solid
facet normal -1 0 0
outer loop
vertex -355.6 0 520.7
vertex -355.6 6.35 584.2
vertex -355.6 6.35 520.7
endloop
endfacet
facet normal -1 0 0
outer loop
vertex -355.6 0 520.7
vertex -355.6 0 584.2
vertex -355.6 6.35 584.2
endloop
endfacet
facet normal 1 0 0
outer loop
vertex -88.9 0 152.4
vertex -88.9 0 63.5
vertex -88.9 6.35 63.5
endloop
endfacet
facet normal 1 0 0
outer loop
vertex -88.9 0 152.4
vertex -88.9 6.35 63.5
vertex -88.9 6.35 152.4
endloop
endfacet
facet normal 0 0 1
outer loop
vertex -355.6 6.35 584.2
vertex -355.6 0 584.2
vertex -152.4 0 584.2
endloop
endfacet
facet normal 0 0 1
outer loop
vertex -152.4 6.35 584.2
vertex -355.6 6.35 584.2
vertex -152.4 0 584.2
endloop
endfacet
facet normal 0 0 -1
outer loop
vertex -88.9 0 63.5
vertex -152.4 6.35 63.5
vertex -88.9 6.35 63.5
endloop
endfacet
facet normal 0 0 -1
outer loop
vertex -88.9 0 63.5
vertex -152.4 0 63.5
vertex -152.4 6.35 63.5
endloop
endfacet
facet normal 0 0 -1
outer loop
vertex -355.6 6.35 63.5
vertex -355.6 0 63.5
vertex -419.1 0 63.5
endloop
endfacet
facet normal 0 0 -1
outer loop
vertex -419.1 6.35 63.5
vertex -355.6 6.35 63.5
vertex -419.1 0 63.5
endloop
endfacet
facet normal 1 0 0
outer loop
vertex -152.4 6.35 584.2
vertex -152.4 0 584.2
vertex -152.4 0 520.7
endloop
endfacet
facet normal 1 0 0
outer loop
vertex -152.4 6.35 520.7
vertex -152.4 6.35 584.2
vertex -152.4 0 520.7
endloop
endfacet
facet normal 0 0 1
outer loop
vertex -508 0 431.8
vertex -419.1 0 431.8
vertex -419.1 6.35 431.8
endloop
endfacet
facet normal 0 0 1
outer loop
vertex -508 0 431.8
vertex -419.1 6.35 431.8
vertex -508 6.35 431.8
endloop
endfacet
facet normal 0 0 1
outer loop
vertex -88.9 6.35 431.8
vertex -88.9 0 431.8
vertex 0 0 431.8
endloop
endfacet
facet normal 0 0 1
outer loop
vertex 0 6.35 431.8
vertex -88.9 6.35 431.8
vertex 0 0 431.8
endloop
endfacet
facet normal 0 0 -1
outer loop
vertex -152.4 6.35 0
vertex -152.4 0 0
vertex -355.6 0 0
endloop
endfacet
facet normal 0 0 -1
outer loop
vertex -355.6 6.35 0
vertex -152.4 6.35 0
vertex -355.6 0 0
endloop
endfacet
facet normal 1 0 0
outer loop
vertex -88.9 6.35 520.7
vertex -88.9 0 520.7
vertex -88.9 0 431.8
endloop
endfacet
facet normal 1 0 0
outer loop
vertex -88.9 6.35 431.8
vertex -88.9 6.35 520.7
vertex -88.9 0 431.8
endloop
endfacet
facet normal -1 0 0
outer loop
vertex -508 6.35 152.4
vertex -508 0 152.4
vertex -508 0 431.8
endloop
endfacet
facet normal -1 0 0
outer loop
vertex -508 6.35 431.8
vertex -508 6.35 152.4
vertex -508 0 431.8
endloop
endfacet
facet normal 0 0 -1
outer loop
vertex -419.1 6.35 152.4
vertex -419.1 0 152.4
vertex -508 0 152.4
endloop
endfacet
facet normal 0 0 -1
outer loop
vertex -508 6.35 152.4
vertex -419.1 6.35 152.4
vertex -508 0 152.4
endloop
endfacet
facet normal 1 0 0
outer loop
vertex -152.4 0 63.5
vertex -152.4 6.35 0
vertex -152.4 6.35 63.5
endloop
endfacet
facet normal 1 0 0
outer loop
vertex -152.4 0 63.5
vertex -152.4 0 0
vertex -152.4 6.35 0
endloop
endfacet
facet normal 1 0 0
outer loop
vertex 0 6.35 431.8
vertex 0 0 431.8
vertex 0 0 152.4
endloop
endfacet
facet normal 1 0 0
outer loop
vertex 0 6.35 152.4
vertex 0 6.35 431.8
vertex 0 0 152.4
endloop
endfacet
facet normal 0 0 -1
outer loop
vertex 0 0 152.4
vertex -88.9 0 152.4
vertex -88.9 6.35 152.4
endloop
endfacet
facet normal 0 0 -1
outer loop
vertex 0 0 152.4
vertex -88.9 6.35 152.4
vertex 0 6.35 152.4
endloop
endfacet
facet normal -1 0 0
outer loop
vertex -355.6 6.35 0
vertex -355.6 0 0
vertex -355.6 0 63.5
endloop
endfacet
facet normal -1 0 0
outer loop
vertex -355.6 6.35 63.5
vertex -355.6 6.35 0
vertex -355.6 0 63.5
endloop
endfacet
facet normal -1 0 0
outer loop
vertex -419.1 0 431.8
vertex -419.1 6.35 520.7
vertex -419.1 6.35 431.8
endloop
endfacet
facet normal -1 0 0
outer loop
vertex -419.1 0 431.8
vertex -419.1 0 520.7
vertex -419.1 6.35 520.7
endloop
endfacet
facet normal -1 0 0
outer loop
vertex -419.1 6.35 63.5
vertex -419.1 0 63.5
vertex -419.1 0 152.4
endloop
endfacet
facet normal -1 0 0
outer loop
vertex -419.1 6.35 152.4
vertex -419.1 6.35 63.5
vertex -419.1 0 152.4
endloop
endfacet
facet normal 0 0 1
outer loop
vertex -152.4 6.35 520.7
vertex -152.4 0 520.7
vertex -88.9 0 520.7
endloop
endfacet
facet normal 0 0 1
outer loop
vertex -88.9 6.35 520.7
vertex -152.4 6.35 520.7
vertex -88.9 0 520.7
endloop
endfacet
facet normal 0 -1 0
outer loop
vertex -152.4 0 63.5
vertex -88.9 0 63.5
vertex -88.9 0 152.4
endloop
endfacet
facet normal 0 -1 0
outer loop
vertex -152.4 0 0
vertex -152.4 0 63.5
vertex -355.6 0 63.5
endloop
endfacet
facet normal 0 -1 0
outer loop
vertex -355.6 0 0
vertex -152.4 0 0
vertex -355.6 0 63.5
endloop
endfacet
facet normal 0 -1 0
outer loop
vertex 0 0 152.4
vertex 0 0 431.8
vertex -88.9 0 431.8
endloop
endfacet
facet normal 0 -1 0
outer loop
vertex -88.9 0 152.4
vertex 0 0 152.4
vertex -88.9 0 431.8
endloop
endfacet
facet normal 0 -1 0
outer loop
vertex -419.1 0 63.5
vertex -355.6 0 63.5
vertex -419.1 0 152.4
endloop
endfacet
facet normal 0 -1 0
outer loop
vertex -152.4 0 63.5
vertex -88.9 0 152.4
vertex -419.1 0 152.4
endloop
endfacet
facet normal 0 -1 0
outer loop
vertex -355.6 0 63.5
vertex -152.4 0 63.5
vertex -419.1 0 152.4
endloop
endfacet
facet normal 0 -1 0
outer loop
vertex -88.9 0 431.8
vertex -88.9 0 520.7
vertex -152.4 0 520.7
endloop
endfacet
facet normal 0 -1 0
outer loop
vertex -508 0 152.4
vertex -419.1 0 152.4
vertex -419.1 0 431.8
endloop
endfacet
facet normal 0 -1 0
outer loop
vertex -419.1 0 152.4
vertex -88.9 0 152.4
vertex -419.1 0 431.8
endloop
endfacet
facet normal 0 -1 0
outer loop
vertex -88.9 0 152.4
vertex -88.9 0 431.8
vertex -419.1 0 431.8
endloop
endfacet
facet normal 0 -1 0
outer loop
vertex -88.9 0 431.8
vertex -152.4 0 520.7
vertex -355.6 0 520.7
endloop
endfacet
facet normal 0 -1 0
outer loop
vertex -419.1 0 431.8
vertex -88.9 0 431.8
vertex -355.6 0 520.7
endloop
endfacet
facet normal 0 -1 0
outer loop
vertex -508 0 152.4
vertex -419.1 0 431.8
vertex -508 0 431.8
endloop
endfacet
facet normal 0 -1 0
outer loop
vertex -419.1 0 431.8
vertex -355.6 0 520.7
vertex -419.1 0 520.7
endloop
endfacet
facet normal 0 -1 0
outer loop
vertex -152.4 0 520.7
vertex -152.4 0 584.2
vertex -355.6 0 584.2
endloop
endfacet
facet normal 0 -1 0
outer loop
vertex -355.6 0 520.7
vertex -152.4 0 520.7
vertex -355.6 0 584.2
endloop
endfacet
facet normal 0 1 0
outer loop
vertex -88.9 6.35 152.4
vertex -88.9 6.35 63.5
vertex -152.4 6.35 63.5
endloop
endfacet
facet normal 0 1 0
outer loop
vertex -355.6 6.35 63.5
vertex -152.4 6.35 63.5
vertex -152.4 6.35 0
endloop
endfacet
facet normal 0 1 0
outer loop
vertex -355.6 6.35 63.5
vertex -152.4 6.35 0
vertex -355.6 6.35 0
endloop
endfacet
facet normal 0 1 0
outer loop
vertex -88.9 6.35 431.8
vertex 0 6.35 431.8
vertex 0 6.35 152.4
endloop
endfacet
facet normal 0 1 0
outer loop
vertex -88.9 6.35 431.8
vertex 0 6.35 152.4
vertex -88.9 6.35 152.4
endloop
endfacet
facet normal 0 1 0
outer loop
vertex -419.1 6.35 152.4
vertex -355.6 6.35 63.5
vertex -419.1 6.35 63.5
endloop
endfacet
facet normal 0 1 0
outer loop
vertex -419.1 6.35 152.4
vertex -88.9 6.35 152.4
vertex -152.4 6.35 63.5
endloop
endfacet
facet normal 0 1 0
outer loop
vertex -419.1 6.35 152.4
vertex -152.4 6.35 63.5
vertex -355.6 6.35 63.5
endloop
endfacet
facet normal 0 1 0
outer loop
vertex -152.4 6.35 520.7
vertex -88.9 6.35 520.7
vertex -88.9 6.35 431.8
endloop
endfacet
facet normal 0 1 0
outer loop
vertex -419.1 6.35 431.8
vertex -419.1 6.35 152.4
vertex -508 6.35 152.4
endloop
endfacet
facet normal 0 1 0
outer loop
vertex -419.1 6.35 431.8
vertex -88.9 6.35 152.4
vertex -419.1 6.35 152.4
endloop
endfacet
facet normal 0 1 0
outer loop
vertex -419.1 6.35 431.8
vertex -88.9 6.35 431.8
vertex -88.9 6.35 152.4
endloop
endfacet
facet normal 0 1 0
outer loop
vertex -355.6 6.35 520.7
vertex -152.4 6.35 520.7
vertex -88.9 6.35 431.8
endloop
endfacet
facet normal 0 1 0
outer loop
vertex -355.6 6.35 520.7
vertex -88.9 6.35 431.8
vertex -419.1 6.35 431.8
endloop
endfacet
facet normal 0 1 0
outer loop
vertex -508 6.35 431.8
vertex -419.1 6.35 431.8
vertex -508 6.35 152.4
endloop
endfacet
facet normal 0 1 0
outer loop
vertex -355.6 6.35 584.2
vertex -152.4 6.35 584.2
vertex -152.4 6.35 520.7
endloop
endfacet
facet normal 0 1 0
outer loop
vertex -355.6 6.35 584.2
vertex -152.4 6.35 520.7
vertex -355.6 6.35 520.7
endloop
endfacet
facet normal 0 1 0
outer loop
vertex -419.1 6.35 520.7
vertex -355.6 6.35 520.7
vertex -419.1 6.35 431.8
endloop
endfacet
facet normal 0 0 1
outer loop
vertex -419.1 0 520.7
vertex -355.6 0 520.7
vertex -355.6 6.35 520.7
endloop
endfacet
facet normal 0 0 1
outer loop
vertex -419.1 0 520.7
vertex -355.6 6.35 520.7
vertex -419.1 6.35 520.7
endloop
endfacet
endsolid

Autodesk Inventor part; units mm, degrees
ref_plane "YZ Plane" through (0, 0, 0) normal (1, 0, 0) x (0, 1, 0)
ref_plane "XZ Plane" through (0, 0, 0) normal (0, 1, 0) x (-1, 0, 0)
ref_plane "XY Plane" through (0, 0, 0) normal (0, 0, 1) x (1, 0, 0)
sketch "Sketch1" plane through (0, 0, 0) normal (0, 1, 0) x (-1, 0, 0)
  line L0 (0, 0) -> (508, 0)
  line L1 (508, 0) -> (508, 584.2)
  line L2 (508, 584.2) -> (0, 584.2)
  line L3 (0, 584.2) -> (0, 0)
  dimension "d0" = 508
  dimension "d1" = 584.2
extrude "Extrusion1" add sketch "Sketch1" along normal blind 6.35
sketch "Sketch2" plane through (0, 0, 0) normal (0, -1, 0) x (1, 0, 0)
  line L0 (-508, 584.2) -> (-355.6, 584.2)
  line L1 (-355.6, 584.2) -> (-355.6, 520.7)
  line L2 (-355.6, 520.7) -> (-508, 520.7)
  line L3 (-508, 520.7) -> (-508, 584.2)
  line L4 (0, 584.2) -> (-152.4, 584.2)
  line L5 (-152.4, 584.2) -> (-152.4, 520.7)
  line L6 (-152.4, 520.7) -> (0, 520.7)
  line L7 (0, 520.7) -> (0, 584.2)
  line L8 (-508, 0) -> (-355.6, 0)
  line L9 (-355.6, 0) -> (-355.6, 63.5)
  line L10 (-355.6, 63.5) -> (-508, 63.5)
  line L11 (-508, 63.5) -> (-508, 0)
  line L12 (0, 0) -> (-152.4, 0)
  line L13 (-152.4, 0) -> (-152.4, 63.5)
  line L14 (-152.4, 63.5) -> (0, 63.5)
  line L15 (0, 63.5) -> (0, 0)
  dimension "d4" = 152.4
  dimension "d5" = 63.5
  dimension "d6" = 152.4
  dimension "d7" = 63.5
  dimension "d8" = 152.4
  dimension "d9" = 63.5
  dimension "d10" = 152.4
  dimension "d11" = 63.5
extrude "Extrusion2" cut sketch "Sketch2" against normal through all
sketch "Sketch5" plane through (0, 0, 0) normal (0, -1, 0) x (1, 0, 0)
  line L0 (-152.4, 63.5) -> (0, 63.5) projected
  line L1 (0, 520.7) -> (0, 63.5) projected
  line L2 (-508, 520.7) -> (-419.1, 520.7)
  line L3 (-419.1, 520.7) -> (-419.1, 431.8)
  line L4 (-419.1, 431.8) -> (-508, 431.8)
  line L5 (-508, 431.8) -> (-508, 520.7)
  line L6 (0, 520.7) -> (-88.9, 520.7)
  line L7 (-88.9, 520.7) -> (-88.9, 431.8)
  line L8 (-88.9, 431.8) -> (0, 431.8)
  line L9 (0, 431.8) -> (0, 520.7)
  line L10 (-508, 63.5) -> (-419.1, 63.5)
  line L11 (-419.1, 63.5) -> (-419.1, 152.4)
  line L12 (-419.1, 152.4) -> (-508, 152.4)
  line L13 (-508, 152.4) -> (-508, 63.5)
  line L14 (0, 63.5) -> (-88.9, 63.5)
  line L15 (-88.9, 63.5) -> (-88.9, 152.4)
  line L16 (-88.9, 152.4) -> (0, 152.4)
  line L17 (0, 152.4) -> (0, 63.5)
  point P0 (0, 0)
  dimension "d24" = 88.9
  dimension "d25" = 88.9
  dimension "d26" = 88.9
  dimension "d27" = 88.9
  dimension "d28" = 88.9
  dimension "d29" = 88.9
  dimension "d30" = 88.9
  dimension "d31" = 88.9
extrude "Extrusion4" cut sketch "Sketch5" against normal blind 6.35
properties part number "Belly Board" material "ABS Plastic"
